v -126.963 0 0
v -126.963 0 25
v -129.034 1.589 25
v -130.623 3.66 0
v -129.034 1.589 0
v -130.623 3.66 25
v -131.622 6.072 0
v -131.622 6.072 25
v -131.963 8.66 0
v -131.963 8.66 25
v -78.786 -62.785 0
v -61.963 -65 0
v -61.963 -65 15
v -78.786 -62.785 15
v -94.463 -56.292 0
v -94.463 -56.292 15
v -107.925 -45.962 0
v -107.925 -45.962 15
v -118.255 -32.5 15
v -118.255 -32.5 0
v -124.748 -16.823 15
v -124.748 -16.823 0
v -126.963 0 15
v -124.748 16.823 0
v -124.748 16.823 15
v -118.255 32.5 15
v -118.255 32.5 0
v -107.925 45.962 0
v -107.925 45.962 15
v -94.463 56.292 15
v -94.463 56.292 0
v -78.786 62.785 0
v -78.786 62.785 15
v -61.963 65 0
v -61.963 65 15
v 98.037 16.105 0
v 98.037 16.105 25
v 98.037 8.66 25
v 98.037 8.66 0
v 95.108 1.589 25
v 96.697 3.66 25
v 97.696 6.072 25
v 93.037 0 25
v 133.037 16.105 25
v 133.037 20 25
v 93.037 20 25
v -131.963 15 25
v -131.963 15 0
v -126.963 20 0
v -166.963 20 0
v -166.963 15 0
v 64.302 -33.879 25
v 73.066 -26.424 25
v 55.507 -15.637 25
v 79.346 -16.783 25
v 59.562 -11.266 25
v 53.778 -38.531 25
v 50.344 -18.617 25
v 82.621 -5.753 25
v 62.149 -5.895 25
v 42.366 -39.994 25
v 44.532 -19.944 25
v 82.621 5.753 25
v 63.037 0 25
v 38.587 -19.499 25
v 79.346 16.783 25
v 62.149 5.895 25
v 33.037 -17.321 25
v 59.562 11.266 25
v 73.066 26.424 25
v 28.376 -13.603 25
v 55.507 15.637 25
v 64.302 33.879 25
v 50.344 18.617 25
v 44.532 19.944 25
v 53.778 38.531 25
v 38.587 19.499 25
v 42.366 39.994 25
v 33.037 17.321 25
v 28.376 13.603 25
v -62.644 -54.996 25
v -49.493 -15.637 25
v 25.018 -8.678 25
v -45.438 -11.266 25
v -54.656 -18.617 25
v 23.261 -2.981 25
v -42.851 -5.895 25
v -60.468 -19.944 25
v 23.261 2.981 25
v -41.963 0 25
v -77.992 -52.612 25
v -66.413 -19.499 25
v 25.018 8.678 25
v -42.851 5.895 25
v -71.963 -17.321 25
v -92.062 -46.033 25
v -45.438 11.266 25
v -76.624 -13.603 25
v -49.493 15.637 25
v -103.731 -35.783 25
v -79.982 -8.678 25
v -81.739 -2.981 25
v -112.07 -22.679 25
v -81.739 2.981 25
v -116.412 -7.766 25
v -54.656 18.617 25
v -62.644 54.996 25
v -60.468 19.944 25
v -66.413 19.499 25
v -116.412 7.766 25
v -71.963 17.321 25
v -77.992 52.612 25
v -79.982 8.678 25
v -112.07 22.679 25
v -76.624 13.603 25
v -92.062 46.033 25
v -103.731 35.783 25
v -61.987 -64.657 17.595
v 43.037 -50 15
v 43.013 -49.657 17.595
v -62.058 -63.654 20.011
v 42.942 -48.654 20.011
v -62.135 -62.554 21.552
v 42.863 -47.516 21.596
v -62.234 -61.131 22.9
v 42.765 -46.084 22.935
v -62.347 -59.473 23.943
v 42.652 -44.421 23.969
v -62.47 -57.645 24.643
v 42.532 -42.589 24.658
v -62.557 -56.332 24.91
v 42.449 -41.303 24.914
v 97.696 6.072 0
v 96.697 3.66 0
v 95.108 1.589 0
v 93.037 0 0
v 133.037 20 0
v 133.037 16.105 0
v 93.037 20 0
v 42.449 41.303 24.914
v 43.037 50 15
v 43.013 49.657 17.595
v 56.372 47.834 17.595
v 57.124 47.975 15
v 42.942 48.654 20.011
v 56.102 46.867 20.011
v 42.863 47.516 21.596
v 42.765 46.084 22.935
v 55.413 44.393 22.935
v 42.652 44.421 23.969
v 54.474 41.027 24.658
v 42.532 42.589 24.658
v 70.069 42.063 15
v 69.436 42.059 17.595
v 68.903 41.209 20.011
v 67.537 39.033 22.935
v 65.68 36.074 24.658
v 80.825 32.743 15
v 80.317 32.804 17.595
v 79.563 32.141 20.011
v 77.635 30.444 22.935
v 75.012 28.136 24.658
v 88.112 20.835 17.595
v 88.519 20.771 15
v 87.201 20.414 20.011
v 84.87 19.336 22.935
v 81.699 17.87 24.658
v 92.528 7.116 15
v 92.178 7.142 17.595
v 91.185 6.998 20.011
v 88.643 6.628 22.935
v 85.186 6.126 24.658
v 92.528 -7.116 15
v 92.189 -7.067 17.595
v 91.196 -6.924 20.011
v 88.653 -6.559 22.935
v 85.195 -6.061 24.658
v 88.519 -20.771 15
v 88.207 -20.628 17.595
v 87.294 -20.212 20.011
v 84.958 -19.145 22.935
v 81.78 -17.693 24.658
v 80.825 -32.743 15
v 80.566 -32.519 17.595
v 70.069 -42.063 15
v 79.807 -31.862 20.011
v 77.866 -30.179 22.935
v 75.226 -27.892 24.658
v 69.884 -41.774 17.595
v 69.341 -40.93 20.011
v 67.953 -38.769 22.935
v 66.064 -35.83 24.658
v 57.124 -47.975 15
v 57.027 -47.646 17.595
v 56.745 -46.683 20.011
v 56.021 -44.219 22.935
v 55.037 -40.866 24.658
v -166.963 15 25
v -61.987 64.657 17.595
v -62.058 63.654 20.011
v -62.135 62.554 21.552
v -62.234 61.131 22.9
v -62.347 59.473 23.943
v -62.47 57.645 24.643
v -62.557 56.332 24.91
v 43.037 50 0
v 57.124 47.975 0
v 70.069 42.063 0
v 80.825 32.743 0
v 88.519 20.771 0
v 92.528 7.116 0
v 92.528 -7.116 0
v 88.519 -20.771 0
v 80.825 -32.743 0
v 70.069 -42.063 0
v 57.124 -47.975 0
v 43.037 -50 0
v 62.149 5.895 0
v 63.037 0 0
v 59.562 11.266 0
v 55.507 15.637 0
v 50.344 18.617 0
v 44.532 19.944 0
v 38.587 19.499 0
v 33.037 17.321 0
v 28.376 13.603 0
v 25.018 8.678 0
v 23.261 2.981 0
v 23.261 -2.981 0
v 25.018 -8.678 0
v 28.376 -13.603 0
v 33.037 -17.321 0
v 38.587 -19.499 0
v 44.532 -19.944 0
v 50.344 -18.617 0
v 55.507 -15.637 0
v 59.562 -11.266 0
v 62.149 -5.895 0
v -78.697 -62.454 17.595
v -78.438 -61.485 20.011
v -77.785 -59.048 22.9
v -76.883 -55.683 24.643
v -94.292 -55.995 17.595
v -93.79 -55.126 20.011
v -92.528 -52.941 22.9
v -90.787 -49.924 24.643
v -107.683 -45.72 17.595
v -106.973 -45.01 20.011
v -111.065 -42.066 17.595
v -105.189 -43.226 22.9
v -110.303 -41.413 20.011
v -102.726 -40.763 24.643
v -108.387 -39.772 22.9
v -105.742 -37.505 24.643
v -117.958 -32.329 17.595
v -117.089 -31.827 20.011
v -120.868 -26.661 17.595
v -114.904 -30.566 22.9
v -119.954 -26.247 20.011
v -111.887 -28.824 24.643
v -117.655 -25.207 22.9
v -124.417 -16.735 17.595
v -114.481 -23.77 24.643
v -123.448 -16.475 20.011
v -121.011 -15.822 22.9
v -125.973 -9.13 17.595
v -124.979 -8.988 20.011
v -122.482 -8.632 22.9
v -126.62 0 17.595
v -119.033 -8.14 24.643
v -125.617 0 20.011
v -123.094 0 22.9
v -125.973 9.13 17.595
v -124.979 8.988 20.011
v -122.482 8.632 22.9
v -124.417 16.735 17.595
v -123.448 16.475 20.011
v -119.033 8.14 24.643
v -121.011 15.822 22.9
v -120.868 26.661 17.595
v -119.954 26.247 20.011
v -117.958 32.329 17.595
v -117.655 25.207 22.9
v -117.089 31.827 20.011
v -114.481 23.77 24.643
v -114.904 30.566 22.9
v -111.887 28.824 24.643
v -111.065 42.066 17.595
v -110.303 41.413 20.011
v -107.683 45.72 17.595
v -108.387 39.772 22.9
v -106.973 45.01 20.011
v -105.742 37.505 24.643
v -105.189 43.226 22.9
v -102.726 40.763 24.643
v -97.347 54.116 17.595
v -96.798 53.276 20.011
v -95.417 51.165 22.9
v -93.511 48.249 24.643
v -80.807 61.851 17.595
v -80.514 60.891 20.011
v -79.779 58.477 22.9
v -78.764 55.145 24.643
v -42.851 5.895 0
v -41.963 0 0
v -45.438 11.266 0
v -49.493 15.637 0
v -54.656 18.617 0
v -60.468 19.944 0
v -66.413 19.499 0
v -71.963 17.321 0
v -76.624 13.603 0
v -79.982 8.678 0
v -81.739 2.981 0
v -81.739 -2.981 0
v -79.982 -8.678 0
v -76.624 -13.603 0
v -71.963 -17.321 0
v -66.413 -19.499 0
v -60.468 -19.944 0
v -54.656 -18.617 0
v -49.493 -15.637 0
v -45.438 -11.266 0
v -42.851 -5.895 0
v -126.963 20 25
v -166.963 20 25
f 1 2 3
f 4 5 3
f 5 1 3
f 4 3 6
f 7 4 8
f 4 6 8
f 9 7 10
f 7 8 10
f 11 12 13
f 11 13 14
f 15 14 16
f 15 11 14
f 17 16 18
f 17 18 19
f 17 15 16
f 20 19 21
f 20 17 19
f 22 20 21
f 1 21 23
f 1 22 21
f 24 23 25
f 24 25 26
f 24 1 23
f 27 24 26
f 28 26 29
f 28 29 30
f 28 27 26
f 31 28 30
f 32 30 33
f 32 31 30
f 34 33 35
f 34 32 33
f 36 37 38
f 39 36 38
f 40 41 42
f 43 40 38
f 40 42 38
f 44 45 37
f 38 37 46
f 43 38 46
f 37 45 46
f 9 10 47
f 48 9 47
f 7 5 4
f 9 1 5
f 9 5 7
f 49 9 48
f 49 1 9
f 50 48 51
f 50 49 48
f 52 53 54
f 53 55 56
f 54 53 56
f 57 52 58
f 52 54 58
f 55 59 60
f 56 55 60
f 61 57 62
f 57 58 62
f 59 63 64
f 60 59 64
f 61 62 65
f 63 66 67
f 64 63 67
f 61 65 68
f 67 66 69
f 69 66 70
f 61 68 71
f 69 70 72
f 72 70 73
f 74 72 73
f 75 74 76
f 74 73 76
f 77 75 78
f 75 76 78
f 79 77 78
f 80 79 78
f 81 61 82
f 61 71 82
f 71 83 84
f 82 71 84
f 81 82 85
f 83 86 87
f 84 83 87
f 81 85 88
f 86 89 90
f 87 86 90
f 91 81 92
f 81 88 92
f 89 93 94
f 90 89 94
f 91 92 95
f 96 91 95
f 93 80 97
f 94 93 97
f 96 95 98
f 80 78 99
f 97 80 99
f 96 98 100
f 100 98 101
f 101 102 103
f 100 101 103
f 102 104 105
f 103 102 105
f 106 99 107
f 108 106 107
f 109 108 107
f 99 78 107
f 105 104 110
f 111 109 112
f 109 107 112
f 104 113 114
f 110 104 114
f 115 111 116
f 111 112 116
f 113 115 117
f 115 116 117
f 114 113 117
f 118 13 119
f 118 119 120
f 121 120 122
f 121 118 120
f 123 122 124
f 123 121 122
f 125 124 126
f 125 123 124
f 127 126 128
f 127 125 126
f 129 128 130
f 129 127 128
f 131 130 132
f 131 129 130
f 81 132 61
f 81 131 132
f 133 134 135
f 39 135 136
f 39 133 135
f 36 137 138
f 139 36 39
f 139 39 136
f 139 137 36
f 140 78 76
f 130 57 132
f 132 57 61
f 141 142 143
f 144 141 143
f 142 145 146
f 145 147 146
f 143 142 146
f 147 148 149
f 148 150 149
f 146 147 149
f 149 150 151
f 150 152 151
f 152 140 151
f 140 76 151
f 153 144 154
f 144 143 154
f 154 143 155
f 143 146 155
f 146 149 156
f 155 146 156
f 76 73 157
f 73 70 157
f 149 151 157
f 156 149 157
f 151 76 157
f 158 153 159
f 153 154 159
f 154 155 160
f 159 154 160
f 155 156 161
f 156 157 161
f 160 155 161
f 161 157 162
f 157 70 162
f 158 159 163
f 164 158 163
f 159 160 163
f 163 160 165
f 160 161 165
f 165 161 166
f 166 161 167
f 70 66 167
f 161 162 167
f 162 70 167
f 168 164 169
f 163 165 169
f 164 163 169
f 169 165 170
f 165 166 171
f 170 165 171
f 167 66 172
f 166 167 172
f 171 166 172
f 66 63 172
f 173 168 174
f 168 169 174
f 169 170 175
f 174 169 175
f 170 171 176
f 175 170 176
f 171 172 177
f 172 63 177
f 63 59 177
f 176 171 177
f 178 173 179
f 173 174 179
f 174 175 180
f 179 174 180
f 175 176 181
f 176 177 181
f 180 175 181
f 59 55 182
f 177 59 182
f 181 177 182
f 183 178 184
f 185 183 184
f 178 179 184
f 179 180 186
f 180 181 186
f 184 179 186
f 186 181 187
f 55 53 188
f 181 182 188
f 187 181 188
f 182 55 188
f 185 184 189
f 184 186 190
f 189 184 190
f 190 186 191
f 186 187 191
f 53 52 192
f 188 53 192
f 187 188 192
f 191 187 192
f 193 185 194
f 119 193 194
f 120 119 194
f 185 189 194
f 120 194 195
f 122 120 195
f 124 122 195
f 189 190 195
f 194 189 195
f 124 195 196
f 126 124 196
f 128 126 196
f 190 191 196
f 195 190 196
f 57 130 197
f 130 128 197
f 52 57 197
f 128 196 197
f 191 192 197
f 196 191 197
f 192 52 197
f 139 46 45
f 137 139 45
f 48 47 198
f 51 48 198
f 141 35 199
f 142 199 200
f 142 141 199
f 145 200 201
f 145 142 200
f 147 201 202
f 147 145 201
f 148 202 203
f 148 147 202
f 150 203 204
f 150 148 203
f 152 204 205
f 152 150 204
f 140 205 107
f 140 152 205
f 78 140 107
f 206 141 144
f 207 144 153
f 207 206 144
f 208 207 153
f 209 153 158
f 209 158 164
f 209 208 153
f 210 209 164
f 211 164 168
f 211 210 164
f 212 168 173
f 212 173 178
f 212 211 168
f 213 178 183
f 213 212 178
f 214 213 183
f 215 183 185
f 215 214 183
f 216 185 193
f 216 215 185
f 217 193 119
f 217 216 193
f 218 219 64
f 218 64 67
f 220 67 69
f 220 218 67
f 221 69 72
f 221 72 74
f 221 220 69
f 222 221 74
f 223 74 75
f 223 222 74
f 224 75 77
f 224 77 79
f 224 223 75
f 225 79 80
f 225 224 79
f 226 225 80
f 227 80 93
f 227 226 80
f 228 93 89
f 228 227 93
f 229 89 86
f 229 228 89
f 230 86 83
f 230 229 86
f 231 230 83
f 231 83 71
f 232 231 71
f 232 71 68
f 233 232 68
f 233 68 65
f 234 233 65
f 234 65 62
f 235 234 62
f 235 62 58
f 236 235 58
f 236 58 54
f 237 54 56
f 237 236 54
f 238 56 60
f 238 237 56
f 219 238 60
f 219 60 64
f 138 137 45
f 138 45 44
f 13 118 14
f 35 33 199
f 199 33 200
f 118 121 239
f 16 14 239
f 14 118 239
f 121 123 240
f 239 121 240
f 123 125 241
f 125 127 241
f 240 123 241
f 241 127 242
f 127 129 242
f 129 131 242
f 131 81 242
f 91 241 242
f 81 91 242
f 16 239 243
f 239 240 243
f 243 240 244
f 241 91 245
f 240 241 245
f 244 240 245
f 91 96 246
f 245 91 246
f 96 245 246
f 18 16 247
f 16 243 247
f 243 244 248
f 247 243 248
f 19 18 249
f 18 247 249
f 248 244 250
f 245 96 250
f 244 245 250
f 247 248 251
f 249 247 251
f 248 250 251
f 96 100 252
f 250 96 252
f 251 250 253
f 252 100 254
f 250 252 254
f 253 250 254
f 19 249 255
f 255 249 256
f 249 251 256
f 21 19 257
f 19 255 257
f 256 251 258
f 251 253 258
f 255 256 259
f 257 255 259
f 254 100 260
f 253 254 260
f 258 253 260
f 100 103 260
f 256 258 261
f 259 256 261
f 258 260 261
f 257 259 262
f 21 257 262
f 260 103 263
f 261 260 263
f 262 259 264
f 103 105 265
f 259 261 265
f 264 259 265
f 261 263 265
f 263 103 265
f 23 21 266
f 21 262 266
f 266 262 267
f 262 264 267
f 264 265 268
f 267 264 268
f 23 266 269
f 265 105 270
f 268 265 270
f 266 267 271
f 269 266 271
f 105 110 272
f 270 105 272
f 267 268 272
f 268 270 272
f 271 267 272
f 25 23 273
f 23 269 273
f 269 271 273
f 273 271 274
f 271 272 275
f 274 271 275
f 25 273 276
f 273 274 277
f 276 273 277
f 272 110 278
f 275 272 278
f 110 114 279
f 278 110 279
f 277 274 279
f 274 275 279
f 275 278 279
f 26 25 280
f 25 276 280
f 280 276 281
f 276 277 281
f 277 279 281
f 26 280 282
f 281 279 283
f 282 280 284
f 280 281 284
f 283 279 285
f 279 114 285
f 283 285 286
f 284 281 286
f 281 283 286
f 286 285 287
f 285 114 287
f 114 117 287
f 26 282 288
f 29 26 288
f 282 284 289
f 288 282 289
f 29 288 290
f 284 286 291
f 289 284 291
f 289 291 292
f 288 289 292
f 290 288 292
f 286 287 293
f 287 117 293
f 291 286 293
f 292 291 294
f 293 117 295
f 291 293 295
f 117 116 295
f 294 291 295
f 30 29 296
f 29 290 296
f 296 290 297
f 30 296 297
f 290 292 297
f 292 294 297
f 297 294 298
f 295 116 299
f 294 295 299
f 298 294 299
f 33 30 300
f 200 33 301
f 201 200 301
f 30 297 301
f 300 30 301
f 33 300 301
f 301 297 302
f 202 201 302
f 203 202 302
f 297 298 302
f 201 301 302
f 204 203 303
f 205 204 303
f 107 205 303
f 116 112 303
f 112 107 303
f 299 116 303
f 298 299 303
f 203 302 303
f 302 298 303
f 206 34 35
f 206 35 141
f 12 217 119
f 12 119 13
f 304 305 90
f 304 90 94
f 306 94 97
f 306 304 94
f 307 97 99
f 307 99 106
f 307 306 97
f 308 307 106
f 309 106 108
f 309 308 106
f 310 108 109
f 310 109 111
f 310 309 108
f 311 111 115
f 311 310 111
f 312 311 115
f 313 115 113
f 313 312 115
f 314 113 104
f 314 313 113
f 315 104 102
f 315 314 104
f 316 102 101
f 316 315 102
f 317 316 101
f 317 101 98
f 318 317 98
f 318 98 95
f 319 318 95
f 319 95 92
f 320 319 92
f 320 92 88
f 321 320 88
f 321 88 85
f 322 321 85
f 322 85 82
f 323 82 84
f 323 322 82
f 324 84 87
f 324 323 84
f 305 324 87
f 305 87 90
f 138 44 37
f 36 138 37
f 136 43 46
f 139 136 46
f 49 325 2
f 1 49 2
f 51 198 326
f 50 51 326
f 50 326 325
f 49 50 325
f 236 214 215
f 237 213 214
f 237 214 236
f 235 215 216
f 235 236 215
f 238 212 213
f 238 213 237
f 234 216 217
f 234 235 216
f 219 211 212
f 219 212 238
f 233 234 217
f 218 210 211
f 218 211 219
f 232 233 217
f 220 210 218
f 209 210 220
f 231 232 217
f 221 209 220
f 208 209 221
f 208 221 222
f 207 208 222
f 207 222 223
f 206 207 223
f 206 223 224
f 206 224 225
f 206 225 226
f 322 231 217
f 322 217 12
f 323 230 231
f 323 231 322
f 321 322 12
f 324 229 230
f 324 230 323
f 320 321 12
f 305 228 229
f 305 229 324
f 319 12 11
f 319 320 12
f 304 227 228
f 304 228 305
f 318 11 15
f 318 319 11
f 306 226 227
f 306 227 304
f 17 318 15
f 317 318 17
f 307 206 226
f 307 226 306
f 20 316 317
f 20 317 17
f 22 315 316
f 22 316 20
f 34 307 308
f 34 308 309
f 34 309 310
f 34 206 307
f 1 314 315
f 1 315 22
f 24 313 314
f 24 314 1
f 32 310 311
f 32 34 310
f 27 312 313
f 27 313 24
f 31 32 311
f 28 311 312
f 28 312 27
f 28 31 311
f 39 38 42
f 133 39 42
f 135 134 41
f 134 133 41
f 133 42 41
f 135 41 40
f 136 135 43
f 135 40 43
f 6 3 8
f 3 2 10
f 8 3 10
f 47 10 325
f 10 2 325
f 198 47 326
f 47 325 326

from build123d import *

# Parameters (mm, degrees)
SKETCH1_R           = 20
BOSS_EXTRUDE1_DEPTH = 25
FILLET1_R           = 10
BOSS_EXTRUDE2_DEPTH = 25
FILLET2_R           = 10
BOSS_EXTRUDE3_DEPTH = 25
FILLET3_R           = 10


with BuildPart() as part:
    # Sketch1 → Boss-Extrude1 (new body)
    with BuildSketch(Plane.XY):
        with BuildLine():
            Line((-61.96286897, 65), (43.03713103, 50))
            ThreePointArc((43.03713103, 50), (93.03713103, 0), (43.03713103, -50))
            Line((43.03713103, -50), (-61.96286897, -65))
            ThreePointArc((-61.96286897, -65), (-126.96286897, 0), (-61.96286897, 65))
        make_face()
        with Locations((43.03713103, 0)):
            Circle(SKETCH1_R, mode=Mode.SUBTRACT)
        with Locations((-61.96286897, 0)):
            Circle(SKETCH1_R, mode=Mode.SUBTRACT)
    extrude(amount=BOSS_EXTRUDE1_DEPTH)

    # Fillet1
    fillet1_edges = [part.edges().sort_by_distance(p)[0] for p in [
        (93.03713103, 0, 25),
        (-9.46286897, 57.5, 25),
        (-126.96286897, 0, 25),
        (-9.46286897, -57.5, 25),
    ]]
    fillet(fillet1_edges, radius=FILLET1_R)


with BuildPart() as body_2:
    # Sketch3 → Boss-Extrude2 (new body)
    with BuildSketch(Plane.XY.offset(25)):
        Polygon((93.03713103, 0), (93.03713103, 20), (133.03713103, 20), (133.03713103, 16.104825027), (98.03713103, 16.104825027), (98.03713103, 0), align=None)
    extrude(amount=-BOSS_EXTRUDE2_DEPTH)

    # Fillet2
    # the kernel refuses this fillet: 10 mm, written as the material it takes off along each edge
    with BuildSketch(Plane(origin=(98.03713103, 0, 46.650635095), x_dir=(0, 1, 0), z_dir=(0, 0, -1))) as fillet2_piece_1:
        with BuildLine():
            CenterArc((8.660254038, -10), FILLET2_R, 90, 60)
            Line((0, -5), (-0.173205081, -4.9))
            ThreePointArc((-0.173205081, -4.9), (-0.2, -2.5), (-0.2, 0))
            Line((-0.2, 0), (0, 0.2))
            Line((0, 0.2), (8.660254038, 0.2))
            Line((8.660254038, 0.2), (8.660254038, 0))
        make_face()
    extrude(amount=68.301270189, mode=Mode.SUBTRACT)


with BuildPart() as body_3:
    # Sketch4 → Boss-Extrude3 (new body)
    with BuildSketch(Plane.XY.offset(25)):
        Polygon((-126.96286897, 0), (-131.96286897, 0), (-131.96286897, 15), (-166.96286897, 15), (-166.96286897, 20), (-126.96286897, 20), align=None)
    extrude(amount=-BOSS_EXTRUDE3_DEPTH)

    # Fillet3
    # the kernel refuses this fillet: 10 mm, written as the material it takes off along each edge
    with BuildSketch(Plane(origin=(-131.96286897, 0, 46.650635095), x_dir=(1, 0, 0), z_dir=(0, 0, -1))) as fillet3_piece_1:
        with BuildLine():
            CenterArc((10, -8.660254038), FILLET3_R, 120, 60)
            Line((0, -8.660254038), (-0.2, -8.660254038))
            Line((-0.2, -8.660254038), (-0.2, 0))
            Line((-0.2, 0), (0, 0.2))
            ThreePointArc((0, 0.2), (2.5, 0.2), (4.9, 0.173205081))
            Line((4.9, 0.173205081), (5, 0))
        make_face()
    extrude(amount=68.301270189, mode=Mode.SUBTRACT)


solid = Compound([part.part, body_2.part, body_3.part])
